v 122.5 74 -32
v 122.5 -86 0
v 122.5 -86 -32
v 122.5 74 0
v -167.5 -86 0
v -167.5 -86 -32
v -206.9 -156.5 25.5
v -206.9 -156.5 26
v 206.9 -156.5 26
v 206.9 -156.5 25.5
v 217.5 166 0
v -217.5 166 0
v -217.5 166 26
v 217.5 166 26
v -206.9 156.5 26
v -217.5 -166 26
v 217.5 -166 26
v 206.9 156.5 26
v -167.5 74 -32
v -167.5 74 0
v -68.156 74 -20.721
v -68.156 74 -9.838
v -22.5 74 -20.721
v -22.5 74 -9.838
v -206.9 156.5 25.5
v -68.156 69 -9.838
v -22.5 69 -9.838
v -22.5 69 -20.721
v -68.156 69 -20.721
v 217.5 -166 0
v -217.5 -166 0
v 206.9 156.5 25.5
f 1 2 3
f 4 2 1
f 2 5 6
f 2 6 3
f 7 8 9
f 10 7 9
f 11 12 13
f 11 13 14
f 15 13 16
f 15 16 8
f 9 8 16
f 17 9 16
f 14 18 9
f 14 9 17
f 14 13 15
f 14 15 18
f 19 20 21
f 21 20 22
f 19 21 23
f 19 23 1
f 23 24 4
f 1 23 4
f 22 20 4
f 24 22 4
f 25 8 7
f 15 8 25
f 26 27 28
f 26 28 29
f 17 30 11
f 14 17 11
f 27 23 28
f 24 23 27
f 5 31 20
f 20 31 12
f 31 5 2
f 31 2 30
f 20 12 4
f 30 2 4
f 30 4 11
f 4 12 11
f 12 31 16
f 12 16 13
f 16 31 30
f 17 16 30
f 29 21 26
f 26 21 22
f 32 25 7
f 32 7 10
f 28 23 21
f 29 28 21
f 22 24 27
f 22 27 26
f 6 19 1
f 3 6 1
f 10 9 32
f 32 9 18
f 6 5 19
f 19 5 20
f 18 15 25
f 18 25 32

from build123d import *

# Parameters (mm, degrees)
F0_W     = 435
F0_H     = 332
F1_DEPTH = 26
F2_W     = 413.8
F2_H     = 313
F3_DEPTH = 0.5
F4_W     = 290
F4_H     = 160
F5_DEPTH = 32
F6_W     = 45.65622
F6_H     = 10.88232
F7_DEPTH = 5


with BuildPart() as f1:
    # F0 (on Top) → F1 (new body)
    with BuildSketch(Plane.XY):
        Rectangle(F0_W, F0_H)
    extrude(amount=F1_DEPTH)

    # F2 (on face) → F3 (cut)
    with BuildSketch(Plane.XY.offset(26)):
        Rectangle(F2_W, F2_H)
    extrude(amount=-F3_DEPTH, mode=Mode.SUBTRACT)

    # F4 (on face) → F5 (join)
    with BuildSketch(Plane.XY):
        with Locations((-22.5, -6)):
            Rectangle(F4_W, F4_H)
    extrude(amount=-F5_DEPTH)

    # F6 (on face) → F7 (cut)
    with BuildSketch(Plane(origin=(0, 74, 0), x_dir=(-1, 0, 0), z_dir=(0, 1, 0))):
        with Locations((45.32811, -15.279424)):
            Rectangle(F6_W, F6_H)
    extrude(amount=-F7_DEPTH, mode=Mode.SUBTRACT)


solid = f1.part
